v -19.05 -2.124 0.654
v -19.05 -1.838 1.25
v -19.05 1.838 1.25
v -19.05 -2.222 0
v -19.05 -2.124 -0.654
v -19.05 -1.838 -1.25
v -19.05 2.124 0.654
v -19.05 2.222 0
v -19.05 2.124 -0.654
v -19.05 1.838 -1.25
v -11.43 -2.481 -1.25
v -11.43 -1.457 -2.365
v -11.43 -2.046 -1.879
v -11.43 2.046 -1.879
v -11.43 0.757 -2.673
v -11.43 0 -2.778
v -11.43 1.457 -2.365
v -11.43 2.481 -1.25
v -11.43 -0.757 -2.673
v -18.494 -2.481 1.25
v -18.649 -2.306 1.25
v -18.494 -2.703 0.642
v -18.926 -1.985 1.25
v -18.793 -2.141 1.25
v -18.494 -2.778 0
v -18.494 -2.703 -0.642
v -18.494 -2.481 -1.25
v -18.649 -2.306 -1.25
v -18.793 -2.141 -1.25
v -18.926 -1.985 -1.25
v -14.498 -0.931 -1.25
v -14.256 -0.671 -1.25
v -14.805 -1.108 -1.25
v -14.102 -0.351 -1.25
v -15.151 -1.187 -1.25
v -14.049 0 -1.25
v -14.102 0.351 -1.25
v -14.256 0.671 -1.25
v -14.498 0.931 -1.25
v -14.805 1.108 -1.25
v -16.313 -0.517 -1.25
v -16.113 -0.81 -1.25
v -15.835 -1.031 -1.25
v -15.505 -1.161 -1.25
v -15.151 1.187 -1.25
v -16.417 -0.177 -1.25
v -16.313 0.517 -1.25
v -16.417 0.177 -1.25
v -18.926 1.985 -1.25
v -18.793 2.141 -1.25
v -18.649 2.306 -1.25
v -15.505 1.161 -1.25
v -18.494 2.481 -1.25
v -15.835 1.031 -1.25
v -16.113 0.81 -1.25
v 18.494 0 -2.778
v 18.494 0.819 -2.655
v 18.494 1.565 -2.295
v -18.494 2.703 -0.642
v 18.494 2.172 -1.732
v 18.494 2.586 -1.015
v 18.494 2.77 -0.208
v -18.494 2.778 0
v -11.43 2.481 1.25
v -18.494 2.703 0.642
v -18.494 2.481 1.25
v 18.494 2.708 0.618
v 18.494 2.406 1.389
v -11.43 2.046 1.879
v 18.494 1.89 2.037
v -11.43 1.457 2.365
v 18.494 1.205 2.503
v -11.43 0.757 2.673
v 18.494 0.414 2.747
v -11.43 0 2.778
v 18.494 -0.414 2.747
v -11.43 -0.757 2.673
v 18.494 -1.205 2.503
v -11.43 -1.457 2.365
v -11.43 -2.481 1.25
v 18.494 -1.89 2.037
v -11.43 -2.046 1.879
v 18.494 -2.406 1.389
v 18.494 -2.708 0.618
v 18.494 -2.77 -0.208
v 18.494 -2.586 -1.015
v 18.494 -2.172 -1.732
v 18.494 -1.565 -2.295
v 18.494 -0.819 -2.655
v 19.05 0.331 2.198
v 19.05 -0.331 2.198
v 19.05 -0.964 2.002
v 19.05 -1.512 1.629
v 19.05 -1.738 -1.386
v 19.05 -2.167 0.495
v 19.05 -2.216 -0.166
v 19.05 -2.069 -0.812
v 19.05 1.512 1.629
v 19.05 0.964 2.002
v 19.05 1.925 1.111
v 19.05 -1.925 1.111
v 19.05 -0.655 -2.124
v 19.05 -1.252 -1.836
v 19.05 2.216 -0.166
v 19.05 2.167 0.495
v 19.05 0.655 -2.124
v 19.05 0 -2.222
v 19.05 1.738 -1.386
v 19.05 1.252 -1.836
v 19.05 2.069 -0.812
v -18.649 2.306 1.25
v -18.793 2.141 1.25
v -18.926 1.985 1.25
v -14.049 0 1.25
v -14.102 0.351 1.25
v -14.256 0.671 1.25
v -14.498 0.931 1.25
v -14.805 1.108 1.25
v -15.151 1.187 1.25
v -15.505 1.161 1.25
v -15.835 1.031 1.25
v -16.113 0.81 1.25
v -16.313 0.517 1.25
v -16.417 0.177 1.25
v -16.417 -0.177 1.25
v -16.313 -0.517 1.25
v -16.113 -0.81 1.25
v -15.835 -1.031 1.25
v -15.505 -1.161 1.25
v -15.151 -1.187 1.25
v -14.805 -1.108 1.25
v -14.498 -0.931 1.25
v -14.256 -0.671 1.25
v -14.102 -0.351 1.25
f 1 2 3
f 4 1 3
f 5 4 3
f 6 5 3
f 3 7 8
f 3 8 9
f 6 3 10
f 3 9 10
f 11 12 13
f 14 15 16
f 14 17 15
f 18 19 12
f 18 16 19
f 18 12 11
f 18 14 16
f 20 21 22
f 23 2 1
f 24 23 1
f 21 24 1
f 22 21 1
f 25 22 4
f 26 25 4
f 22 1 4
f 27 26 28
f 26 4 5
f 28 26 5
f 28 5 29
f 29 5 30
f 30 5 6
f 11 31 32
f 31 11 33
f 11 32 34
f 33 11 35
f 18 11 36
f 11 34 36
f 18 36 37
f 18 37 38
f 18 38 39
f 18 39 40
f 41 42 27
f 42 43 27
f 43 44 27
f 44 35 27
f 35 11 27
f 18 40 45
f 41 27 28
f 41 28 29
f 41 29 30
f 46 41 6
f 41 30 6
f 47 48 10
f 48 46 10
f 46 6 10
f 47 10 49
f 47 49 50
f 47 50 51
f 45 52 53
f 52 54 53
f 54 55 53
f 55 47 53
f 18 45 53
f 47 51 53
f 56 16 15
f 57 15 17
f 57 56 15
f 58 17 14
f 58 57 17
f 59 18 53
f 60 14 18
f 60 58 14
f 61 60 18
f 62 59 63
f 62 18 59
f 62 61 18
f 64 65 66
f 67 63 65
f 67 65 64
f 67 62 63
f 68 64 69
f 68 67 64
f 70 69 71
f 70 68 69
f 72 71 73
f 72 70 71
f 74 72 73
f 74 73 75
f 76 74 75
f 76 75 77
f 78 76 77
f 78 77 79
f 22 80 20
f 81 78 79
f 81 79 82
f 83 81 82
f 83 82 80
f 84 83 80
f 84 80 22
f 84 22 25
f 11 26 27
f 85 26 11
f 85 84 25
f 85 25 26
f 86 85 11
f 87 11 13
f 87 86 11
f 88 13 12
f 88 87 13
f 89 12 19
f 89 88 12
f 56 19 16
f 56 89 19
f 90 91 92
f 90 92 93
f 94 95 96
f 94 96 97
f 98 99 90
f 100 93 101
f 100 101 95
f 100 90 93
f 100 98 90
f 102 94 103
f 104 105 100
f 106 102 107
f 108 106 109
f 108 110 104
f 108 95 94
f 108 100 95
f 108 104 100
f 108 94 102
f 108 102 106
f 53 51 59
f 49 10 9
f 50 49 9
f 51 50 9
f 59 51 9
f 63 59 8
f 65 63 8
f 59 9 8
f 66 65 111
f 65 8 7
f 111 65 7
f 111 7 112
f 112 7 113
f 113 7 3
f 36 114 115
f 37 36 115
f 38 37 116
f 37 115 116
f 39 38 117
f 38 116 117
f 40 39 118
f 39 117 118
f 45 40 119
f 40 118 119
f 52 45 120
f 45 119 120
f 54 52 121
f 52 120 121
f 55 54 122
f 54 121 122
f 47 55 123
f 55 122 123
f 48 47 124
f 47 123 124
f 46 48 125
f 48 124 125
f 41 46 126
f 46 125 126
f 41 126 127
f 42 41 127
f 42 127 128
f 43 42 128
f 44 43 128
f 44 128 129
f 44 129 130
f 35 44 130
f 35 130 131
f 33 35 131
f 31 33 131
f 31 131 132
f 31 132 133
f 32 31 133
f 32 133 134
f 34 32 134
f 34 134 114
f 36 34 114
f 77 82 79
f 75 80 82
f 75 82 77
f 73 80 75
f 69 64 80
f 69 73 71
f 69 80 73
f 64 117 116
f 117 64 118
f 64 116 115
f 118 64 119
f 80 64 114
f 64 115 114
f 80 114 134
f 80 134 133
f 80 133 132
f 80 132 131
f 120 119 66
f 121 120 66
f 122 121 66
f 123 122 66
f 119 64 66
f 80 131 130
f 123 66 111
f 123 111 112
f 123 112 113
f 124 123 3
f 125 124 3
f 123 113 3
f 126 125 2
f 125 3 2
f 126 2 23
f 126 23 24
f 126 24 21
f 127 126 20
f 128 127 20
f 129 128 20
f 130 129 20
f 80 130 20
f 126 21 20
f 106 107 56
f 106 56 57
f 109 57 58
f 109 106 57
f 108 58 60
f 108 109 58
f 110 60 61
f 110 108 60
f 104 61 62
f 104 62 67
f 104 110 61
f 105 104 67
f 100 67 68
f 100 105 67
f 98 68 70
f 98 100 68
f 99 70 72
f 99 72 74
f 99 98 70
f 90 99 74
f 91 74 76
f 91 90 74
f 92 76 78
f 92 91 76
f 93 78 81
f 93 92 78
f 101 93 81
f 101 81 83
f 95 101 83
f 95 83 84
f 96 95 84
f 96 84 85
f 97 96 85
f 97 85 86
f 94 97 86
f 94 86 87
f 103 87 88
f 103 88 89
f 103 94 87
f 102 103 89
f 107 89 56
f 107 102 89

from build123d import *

# Parameters (mm, degrees)
SKETCH2_R           = 2.778125
EXTRUDE1_DEPTH      = 19.05
EXTRUDE1_DEPTH_BACK = 19.05
CHAMFER1_SIZE       = 0.555625
CUT_EXTRUDE1_DEPTH  = 7.62
SKETCH5_R           = 1.190625
CUT_EXTRUDE2_DEPTH  = 5.02828125


with BuildPart() as part:
    # Sketch2 → Extrude1 (new body, two sides)
    with BuildSketch(Plane(origin=(0, 0, 0), x_dir=(0, 0, -1), z_dir=(1, 0, 0))) as extrude1_sk:
        Circle(SKETCH2_R)
    extrude(amount=EXTRUDE1_DEPTH)
    extrude(extrude1_sk.sketch, amount=-EXTRUDE1_DEPTH_BACK)

    # Chamfer1
    chamfer1_edges = [part.edges().sort_by_distance(p)[0] for p in [
        (-19.05, 0, 2.778125),
        (19.05, 0, 2.778125),
    ]]
    chamfer(chamfer1_edges, length=CHAMFER1_SIZE)

    # Sketch3 → Cut-Extrude1 (cut)
    with BuildSketch(Plane.ZY.offset(19.05)):
        with BuildLine():
            Line((-3.175, 3.175), (-3.175, -3.175))
            Line((-3.175, -3.175), (-1.25015625, -3.175))
            Line((-1.25015625, -3.175), (-1.25015625, -1.837556965))
            ThreePointArc((-1.25015625, -1.837556965), (-2.2225, 0), (-1.25015625, 1.837556965))
            Line((-1.25015625, 1.837556965), (-1.25015625, 3.175))
            Line((-1.25015625, 3.175), (-3.175, 3.175))
        make_face()
        with BuildLine():
            Line((1.25015625, -1.837556965), (1.25015625, -3.175))
            Line((1.25015625, -3.175), (3.175, -3.175))
            Line((3.175, -3.175), (3.175, 3.175))
            Line((3.175, 3.175), (1.25015625, 3.175))
            Line((1.25015625, 3.175), (1.25015625, 1.837556965))
            ThreePointArc((1.25015625, 1.837556965), (1.964431026, 1.039479193), (2.2225, 0))
            ThreePointArc((2.2225, 0), (1.964431026, -1.039479193), (1.25015625, -1.837556965))
        make_face()
        with BuildLine():
            ThreePointArc((-1.25015625, 1.837556965), (-2.2225, 0), (-1.25015625, -1.837556965))
            Line((-1.25015625, -1.837556965), (-1.25015625, 1.837556965))
        make_face()
        with BuildLine():
            Line((1.25015625, 1.837556965), (1.25015625, -1.837556965))
            ThreePointArc((1.25015625, -1.837556965), (1.964431026, -1.039479193), (2.2225, 0))
            ThreePointArc((2.2225, 0), (1.964431026, 1.039479193), (1.25015625, 1.837556965))
        make_face()
    extrude(amount=-CUT_EXTRUDE1_DEPTH, mode=Mode.SUBTRACT)

    # Sketch5 → Cut-Extrude2 (cut, through all)
    with BuildSketch(Plane.XY.offset(1.25015625)):
        with Locations((-15.24, 0)):
            Circle(SKETCH5_R)
    extrude(amount=-CUT_EXTRUDE2_DEPTH, mode=Mode.SUBTRACT)


solid = part.part
